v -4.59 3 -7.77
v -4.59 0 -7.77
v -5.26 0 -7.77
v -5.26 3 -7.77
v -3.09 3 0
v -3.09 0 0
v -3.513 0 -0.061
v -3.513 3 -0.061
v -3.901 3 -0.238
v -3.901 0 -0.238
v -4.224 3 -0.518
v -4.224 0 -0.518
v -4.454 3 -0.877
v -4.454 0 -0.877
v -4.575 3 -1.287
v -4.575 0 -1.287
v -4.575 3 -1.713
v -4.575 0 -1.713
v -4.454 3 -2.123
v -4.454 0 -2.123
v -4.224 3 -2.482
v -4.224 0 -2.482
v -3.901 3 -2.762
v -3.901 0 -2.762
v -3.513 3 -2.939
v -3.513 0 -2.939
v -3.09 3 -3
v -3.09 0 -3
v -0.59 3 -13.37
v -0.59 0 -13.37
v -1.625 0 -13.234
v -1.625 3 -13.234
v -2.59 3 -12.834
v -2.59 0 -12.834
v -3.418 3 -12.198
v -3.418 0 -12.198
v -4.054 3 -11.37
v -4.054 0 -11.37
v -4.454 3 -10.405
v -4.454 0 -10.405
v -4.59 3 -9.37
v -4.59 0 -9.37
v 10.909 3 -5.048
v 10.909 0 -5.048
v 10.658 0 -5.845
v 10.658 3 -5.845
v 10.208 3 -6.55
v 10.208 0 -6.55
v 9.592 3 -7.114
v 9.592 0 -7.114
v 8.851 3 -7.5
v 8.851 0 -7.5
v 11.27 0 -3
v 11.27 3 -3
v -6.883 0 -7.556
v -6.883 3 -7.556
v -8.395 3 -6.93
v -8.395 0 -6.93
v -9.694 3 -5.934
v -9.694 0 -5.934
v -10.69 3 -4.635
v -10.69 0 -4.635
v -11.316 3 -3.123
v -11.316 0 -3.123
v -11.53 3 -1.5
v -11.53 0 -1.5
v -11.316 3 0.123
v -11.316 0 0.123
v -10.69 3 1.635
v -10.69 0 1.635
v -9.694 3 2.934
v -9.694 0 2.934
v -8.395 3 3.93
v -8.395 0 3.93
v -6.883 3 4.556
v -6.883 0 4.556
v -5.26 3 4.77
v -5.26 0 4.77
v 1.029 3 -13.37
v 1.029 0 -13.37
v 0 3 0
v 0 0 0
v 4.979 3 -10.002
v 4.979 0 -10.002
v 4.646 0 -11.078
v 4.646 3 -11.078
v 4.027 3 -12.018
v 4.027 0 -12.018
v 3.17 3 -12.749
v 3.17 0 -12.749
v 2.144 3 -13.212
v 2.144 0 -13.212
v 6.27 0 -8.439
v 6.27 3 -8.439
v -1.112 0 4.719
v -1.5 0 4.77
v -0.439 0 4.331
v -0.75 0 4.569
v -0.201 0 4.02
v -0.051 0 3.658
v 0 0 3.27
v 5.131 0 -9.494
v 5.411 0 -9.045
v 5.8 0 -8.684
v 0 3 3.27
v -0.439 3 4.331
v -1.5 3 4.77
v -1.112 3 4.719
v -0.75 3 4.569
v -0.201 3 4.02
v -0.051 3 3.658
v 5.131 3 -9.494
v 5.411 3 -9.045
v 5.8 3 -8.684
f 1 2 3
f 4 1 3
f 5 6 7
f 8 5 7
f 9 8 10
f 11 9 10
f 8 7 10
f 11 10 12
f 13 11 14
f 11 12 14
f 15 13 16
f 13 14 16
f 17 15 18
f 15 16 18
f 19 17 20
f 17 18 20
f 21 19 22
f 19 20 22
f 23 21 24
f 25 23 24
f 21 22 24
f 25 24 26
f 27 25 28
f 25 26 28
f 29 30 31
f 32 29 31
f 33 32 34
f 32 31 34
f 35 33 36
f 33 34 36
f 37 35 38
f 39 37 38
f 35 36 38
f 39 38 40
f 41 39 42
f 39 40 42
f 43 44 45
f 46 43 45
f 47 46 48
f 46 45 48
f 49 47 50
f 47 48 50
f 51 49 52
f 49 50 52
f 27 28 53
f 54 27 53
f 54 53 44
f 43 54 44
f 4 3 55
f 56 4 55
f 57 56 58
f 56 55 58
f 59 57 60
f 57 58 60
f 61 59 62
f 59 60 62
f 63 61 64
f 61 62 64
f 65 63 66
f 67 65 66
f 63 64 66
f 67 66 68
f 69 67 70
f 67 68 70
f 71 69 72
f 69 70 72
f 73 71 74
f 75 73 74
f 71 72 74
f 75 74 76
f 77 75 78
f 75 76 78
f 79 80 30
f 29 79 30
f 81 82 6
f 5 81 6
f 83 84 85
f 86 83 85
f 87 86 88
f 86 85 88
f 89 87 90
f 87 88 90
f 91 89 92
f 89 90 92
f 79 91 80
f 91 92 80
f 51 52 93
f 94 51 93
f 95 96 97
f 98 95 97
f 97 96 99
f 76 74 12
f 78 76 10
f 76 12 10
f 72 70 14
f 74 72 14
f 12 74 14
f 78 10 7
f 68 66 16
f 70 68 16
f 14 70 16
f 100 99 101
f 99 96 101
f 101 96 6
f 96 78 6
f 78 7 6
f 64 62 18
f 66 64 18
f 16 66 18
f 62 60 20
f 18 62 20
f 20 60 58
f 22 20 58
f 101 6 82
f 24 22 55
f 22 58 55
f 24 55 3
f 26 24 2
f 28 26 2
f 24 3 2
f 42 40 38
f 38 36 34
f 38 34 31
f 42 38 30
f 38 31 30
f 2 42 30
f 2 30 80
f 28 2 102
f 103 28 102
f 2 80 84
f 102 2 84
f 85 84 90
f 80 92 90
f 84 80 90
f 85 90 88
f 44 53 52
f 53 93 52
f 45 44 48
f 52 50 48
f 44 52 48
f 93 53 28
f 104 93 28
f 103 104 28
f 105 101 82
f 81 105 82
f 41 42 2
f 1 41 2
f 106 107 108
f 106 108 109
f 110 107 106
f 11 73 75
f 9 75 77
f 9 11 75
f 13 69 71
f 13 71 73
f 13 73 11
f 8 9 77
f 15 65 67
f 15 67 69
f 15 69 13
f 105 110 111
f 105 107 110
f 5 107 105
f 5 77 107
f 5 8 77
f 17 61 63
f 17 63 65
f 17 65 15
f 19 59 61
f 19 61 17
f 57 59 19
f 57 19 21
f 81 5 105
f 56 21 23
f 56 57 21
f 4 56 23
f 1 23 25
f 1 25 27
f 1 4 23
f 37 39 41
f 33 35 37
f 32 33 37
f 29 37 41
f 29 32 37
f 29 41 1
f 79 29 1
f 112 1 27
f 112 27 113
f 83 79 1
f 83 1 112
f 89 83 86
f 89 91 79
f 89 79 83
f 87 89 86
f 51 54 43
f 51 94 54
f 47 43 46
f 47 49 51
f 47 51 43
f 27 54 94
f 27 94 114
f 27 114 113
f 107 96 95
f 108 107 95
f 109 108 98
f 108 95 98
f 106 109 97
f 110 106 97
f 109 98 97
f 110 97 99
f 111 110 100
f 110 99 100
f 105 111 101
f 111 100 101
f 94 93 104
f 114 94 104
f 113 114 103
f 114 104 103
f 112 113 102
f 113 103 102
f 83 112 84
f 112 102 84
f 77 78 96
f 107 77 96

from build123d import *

# Parameters (mm, degrees)
BOSS_EXTRUDE2_DEPTH = 3


with BuildPart() as part:
    # Sketch1 → Boss-Extrude2 (new body)
    with BuildSketch(Plane(origin=(0, 0, 0), x_dir=(1, 0, 0), z_dir=(0, 1, 0))):
        with BuildLine():
            Line((0, 0), (-3.09, 0))
            ThreePointArc((-3.09, 0), (-4.59, 1.5), (-3.09, 3))
            Line((-3.09, 3), (11.27, 3))
            Line((11.27, 3), (10.908822115, 5.04834157))
            ThreePointArc((10.908822115, 5.04834157), (10.208482238, 6.549941992), (8.851032589, 7.5))
            Line((8.851032589, 7.5), (6.27, 8.438574292))
            ThreePointArc((6.27, 8.438574292), (5.411457646, 9.044534587), (4.978627211, 10.002104777))
            ThreePointArc((4.978627211, 10.002104777), (3.62422767, 12.413716405), (1.02888753, 13.37))
            Line((1.02888753, 13.37), (-0.59, 13.37))
            ThreePointArc((-0.59, 13.37), (-3.418427125, 12.198427125), (-4.59, 9.37))
            Line((-4.59, 9.37), (-4.59, 7.77))
            Line((-4.59, 7.77), (-5.26, 7.77))
            ThreePointArc((-5.26, 7.77), (-11.53, 1.5), (-5.26, -4.77))
            Line((-5.26, -4.77), (-1.5, -4.77))
            ThreePointArc((-1.5, -4.77), (-0.439339828, -4.330660172), (0, -3.27))
            Line((0, -3.27), (0, 0))
        make_face()
    extrude(amount=BOSS_EXTRUDE2_DEPTH)


solid = part.part
